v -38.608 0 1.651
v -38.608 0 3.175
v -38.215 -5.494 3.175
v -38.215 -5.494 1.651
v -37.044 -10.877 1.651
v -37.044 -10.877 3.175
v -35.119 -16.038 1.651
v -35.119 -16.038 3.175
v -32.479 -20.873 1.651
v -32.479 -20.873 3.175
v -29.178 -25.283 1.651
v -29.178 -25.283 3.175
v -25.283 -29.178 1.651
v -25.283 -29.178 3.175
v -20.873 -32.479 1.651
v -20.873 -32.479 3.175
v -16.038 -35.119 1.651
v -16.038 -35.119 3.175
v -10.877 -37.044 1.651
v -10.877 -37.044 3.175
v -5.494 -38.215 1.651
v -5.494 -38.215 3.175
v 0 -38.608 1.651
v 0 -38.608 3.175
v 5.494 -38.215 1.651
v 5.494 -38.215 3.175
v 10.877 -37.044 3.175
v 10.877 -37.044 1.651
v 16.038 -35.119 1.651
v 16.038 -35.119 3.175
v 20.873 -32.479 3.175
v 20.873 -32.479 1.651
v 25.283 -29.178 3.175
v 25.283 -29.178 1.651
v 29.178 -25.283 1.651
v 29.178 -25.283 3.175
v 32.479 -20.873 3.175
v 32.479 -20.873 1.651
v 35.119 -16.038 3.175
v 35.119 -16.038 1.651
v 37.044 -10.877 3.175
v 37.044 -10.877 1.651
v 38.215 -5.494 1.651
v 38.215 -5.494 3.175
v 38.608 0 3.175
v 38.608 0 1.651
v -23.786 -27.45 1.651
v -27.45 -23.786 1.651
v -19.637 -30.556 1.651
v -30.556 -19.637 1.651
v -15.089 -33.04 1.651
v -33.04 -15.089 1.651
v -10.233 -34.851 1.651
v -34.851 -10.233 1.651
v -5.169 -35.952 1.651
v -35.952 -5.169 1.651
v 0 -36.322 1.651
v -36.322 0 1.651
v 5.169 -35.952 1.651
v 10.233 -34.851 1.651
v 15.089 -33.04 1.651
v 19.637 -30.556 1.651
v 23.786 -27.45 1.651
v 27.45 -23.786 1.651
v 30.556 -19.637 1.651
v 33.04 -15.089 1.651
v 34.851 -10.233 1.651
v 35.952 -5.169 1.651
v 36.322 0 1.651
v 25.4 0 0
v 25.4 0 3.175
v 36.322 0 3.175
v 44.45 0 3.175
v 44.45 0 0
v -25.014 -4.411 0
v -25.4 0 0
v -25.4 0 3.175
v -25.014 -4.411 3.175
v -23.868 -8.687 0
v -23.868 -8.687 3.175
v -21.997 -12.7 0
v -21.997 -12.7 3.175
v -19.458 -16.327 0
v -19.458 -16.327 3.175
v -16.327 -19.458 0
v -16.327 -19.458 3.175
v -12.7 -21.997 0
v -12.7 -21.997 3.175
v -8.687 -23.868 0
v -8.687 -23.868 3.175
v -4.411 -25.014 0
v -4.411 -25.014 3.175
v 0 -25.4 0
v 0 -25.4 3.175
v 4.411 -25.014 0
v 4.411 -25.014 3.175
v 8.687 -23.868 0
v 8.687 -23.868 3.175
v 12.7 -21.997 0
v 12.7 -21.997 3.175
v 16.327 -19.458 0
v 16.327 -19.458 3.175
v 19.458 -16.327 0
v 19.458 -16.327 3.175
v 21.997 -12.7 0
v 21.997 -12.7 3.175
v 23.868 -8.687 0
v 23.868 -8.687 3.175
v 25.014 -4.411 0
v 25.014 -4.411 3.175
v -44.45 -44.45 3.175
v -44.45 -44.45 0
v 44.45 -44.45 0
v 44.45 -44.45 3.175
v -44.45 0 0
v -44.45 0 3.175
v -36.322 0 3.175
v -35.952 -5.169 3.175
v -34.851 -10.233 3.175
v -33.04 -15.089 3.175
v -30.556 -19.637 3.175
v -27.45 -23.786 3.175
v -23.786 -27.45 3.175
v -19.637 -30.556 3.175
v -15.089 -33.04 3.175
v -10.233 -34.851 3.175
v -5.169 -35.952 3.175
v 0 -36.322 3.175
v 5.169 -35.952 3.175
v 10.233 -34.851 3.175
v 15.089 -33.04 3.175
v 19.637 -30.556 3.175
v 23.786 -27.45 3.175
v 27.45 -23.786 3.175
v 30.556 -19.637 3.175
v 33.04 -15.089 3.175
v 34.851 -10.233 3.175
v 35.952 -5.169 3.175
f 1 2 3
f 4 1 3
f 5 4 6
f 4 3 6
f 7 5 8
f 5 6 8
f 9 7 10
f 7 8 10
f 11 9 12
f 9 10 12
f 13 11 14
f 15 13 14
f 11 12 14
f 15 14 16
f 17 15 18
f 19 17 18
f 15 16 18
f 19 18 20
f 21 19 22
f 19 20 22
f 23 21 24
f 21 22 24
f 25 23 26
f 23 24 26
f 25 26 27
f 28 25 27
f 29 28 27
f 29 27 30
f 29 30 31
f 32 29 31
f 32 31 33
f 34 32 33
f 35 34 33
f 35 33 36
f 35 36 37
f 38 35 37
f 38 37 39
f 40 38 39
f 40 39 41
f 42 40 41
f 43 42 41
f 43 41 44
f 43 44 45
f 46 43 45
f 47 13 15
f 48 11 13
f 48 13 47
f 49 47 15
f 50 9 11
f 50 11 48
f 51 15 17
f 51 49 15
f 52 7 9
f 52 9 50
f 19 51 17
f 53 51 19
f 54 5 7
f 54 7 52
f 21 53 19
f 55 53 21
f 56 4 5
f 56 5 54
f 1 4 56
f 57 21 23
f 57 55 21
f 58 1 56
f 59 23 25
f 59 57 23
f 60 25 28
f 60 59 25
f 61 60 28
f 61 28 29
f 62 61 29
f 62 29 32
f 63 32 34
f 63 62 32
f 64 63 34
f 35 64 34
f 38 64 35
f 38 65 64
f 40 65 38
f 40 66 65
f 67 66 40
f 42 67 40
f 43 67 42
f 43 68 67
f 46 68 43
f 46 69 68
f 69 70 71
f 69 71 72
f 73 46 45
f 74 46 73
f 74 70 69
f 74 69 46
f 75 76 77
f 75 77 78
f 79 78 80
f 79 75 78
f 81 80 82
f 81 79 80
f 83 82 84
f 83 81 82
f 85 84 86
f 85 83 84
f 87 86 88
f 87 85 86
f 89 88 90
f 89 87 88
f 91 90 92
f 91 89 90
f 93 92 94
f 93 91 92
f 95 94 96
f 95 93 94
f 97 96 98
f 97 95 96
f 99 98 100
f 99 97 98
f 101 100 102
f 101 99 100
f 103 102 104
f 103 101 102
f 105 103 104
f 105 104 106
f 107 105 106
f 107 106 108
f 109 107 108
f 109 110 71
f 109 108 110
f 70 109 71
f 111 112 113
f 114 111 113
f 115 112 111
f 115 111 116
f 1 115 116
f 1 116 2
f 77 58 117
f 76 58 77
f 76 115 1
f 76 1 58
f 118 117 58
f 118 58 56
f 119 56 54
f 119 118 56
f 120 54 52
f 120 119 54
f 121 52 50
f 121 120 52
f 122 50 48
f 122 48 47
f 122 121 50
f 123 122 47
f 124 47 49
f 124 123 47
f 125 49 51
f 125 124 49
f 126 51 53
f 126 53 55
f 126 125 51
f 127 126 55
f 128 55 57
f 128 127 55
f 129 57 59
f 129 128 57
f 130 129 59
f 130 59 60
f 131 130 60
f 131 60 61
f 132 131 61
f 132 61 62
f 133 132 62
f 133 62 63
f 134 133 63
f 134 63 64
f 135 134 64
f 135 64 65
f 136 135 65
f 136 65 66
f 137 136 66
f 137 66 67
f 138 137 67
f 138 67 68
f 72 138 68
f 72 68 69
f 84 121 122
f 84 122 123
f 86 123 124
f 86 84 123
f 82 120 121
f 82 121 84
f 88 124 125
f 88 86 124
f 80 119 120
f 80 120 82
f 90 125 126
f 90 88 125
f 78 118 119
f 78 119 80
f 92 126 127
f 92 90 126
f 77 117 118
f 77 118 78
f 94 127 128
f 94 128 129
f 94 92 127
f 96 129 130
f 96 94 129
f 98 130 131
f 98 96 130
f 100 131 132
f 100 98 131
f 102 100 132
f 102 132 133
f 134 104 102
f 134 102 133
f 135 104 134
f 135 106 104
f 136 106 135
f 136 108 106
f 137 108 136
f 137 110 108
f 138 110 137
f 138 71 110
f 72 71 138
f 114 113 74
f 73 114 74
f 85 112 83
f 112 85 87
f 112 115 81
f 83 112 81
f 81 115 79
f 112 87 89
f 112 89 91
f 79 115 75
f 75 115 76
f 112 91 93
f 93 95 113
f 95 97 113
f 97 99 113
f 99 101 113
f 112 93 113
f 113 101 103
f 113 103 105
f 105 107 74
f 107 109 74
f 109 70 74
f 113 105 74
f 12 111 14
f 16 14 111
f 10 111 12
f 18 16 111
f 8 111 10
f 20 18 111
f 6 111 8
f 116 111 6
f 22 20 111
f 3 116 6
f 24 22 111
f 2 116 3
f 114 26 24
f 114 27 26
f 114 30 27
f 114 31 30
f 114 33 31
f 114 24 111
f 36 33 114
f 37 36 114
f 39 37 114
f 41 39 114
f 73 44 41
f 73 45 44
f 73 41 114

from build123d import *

# Parameters (mm, degrees)
F0_W     = 88.9
F0_H     = 44.45
F1_DEPTH = 3.175
F2_R     = 38.608
F2_R_2   = 36.322
F3_DEPTH = 1.524
F5_DEPTH = 3.176


with BuildPart() as f1:
    # F0 (on Top) → F1 (new body)
    with BuildSketch(Plane.XY):
        with Locations((0, -22.225)):
            Rectangle(F0_W, F0_H)
    extrude(amount=F1_DEPTH)

    # F2 (on face) → F3 (cut)
    with BuildSketch(Plane.XY.offset(3.175)):
        Circle(F2_R)
        Circle(F2_R_2, mode=Mode.SUBTRACT)
        with BuildLine():
            Line((-13.208, 0), (13.208, 0))
            ThreePointArc((13.208, 0), (0, 13.208), (-13.208, 0))
        make_face()
        with BuildLine():
            ThreePointArc((-13.208, 0), (0, -13.208), (13.208, 0))
            Line((13.208, 0), (-13.208, 0))
        make_face()
    extrude(amount=-F3_DEPTH, mode=Mode.SUBTRACT)

    # F4 (on Top) → F5 (cut, through all)
    with BuildSketch(Plane.XY):
        with BuildLine():
            ThreePointArc((25.4, 0), (0, 25.4), (-25.4, 0))
            Line((-25.4, 0), (25.4, 0))
        make_face()
        with BuildLine():
            Line((25.4, 0), (-25.4, 0))
            ThreePointArc((-25.4, 0), (0, -25.4), (25.4, 0))
        make_face()
    extrude(amount=F5_DEPTH, mode=Mode.SUBTRACT)


solid = f1.part
